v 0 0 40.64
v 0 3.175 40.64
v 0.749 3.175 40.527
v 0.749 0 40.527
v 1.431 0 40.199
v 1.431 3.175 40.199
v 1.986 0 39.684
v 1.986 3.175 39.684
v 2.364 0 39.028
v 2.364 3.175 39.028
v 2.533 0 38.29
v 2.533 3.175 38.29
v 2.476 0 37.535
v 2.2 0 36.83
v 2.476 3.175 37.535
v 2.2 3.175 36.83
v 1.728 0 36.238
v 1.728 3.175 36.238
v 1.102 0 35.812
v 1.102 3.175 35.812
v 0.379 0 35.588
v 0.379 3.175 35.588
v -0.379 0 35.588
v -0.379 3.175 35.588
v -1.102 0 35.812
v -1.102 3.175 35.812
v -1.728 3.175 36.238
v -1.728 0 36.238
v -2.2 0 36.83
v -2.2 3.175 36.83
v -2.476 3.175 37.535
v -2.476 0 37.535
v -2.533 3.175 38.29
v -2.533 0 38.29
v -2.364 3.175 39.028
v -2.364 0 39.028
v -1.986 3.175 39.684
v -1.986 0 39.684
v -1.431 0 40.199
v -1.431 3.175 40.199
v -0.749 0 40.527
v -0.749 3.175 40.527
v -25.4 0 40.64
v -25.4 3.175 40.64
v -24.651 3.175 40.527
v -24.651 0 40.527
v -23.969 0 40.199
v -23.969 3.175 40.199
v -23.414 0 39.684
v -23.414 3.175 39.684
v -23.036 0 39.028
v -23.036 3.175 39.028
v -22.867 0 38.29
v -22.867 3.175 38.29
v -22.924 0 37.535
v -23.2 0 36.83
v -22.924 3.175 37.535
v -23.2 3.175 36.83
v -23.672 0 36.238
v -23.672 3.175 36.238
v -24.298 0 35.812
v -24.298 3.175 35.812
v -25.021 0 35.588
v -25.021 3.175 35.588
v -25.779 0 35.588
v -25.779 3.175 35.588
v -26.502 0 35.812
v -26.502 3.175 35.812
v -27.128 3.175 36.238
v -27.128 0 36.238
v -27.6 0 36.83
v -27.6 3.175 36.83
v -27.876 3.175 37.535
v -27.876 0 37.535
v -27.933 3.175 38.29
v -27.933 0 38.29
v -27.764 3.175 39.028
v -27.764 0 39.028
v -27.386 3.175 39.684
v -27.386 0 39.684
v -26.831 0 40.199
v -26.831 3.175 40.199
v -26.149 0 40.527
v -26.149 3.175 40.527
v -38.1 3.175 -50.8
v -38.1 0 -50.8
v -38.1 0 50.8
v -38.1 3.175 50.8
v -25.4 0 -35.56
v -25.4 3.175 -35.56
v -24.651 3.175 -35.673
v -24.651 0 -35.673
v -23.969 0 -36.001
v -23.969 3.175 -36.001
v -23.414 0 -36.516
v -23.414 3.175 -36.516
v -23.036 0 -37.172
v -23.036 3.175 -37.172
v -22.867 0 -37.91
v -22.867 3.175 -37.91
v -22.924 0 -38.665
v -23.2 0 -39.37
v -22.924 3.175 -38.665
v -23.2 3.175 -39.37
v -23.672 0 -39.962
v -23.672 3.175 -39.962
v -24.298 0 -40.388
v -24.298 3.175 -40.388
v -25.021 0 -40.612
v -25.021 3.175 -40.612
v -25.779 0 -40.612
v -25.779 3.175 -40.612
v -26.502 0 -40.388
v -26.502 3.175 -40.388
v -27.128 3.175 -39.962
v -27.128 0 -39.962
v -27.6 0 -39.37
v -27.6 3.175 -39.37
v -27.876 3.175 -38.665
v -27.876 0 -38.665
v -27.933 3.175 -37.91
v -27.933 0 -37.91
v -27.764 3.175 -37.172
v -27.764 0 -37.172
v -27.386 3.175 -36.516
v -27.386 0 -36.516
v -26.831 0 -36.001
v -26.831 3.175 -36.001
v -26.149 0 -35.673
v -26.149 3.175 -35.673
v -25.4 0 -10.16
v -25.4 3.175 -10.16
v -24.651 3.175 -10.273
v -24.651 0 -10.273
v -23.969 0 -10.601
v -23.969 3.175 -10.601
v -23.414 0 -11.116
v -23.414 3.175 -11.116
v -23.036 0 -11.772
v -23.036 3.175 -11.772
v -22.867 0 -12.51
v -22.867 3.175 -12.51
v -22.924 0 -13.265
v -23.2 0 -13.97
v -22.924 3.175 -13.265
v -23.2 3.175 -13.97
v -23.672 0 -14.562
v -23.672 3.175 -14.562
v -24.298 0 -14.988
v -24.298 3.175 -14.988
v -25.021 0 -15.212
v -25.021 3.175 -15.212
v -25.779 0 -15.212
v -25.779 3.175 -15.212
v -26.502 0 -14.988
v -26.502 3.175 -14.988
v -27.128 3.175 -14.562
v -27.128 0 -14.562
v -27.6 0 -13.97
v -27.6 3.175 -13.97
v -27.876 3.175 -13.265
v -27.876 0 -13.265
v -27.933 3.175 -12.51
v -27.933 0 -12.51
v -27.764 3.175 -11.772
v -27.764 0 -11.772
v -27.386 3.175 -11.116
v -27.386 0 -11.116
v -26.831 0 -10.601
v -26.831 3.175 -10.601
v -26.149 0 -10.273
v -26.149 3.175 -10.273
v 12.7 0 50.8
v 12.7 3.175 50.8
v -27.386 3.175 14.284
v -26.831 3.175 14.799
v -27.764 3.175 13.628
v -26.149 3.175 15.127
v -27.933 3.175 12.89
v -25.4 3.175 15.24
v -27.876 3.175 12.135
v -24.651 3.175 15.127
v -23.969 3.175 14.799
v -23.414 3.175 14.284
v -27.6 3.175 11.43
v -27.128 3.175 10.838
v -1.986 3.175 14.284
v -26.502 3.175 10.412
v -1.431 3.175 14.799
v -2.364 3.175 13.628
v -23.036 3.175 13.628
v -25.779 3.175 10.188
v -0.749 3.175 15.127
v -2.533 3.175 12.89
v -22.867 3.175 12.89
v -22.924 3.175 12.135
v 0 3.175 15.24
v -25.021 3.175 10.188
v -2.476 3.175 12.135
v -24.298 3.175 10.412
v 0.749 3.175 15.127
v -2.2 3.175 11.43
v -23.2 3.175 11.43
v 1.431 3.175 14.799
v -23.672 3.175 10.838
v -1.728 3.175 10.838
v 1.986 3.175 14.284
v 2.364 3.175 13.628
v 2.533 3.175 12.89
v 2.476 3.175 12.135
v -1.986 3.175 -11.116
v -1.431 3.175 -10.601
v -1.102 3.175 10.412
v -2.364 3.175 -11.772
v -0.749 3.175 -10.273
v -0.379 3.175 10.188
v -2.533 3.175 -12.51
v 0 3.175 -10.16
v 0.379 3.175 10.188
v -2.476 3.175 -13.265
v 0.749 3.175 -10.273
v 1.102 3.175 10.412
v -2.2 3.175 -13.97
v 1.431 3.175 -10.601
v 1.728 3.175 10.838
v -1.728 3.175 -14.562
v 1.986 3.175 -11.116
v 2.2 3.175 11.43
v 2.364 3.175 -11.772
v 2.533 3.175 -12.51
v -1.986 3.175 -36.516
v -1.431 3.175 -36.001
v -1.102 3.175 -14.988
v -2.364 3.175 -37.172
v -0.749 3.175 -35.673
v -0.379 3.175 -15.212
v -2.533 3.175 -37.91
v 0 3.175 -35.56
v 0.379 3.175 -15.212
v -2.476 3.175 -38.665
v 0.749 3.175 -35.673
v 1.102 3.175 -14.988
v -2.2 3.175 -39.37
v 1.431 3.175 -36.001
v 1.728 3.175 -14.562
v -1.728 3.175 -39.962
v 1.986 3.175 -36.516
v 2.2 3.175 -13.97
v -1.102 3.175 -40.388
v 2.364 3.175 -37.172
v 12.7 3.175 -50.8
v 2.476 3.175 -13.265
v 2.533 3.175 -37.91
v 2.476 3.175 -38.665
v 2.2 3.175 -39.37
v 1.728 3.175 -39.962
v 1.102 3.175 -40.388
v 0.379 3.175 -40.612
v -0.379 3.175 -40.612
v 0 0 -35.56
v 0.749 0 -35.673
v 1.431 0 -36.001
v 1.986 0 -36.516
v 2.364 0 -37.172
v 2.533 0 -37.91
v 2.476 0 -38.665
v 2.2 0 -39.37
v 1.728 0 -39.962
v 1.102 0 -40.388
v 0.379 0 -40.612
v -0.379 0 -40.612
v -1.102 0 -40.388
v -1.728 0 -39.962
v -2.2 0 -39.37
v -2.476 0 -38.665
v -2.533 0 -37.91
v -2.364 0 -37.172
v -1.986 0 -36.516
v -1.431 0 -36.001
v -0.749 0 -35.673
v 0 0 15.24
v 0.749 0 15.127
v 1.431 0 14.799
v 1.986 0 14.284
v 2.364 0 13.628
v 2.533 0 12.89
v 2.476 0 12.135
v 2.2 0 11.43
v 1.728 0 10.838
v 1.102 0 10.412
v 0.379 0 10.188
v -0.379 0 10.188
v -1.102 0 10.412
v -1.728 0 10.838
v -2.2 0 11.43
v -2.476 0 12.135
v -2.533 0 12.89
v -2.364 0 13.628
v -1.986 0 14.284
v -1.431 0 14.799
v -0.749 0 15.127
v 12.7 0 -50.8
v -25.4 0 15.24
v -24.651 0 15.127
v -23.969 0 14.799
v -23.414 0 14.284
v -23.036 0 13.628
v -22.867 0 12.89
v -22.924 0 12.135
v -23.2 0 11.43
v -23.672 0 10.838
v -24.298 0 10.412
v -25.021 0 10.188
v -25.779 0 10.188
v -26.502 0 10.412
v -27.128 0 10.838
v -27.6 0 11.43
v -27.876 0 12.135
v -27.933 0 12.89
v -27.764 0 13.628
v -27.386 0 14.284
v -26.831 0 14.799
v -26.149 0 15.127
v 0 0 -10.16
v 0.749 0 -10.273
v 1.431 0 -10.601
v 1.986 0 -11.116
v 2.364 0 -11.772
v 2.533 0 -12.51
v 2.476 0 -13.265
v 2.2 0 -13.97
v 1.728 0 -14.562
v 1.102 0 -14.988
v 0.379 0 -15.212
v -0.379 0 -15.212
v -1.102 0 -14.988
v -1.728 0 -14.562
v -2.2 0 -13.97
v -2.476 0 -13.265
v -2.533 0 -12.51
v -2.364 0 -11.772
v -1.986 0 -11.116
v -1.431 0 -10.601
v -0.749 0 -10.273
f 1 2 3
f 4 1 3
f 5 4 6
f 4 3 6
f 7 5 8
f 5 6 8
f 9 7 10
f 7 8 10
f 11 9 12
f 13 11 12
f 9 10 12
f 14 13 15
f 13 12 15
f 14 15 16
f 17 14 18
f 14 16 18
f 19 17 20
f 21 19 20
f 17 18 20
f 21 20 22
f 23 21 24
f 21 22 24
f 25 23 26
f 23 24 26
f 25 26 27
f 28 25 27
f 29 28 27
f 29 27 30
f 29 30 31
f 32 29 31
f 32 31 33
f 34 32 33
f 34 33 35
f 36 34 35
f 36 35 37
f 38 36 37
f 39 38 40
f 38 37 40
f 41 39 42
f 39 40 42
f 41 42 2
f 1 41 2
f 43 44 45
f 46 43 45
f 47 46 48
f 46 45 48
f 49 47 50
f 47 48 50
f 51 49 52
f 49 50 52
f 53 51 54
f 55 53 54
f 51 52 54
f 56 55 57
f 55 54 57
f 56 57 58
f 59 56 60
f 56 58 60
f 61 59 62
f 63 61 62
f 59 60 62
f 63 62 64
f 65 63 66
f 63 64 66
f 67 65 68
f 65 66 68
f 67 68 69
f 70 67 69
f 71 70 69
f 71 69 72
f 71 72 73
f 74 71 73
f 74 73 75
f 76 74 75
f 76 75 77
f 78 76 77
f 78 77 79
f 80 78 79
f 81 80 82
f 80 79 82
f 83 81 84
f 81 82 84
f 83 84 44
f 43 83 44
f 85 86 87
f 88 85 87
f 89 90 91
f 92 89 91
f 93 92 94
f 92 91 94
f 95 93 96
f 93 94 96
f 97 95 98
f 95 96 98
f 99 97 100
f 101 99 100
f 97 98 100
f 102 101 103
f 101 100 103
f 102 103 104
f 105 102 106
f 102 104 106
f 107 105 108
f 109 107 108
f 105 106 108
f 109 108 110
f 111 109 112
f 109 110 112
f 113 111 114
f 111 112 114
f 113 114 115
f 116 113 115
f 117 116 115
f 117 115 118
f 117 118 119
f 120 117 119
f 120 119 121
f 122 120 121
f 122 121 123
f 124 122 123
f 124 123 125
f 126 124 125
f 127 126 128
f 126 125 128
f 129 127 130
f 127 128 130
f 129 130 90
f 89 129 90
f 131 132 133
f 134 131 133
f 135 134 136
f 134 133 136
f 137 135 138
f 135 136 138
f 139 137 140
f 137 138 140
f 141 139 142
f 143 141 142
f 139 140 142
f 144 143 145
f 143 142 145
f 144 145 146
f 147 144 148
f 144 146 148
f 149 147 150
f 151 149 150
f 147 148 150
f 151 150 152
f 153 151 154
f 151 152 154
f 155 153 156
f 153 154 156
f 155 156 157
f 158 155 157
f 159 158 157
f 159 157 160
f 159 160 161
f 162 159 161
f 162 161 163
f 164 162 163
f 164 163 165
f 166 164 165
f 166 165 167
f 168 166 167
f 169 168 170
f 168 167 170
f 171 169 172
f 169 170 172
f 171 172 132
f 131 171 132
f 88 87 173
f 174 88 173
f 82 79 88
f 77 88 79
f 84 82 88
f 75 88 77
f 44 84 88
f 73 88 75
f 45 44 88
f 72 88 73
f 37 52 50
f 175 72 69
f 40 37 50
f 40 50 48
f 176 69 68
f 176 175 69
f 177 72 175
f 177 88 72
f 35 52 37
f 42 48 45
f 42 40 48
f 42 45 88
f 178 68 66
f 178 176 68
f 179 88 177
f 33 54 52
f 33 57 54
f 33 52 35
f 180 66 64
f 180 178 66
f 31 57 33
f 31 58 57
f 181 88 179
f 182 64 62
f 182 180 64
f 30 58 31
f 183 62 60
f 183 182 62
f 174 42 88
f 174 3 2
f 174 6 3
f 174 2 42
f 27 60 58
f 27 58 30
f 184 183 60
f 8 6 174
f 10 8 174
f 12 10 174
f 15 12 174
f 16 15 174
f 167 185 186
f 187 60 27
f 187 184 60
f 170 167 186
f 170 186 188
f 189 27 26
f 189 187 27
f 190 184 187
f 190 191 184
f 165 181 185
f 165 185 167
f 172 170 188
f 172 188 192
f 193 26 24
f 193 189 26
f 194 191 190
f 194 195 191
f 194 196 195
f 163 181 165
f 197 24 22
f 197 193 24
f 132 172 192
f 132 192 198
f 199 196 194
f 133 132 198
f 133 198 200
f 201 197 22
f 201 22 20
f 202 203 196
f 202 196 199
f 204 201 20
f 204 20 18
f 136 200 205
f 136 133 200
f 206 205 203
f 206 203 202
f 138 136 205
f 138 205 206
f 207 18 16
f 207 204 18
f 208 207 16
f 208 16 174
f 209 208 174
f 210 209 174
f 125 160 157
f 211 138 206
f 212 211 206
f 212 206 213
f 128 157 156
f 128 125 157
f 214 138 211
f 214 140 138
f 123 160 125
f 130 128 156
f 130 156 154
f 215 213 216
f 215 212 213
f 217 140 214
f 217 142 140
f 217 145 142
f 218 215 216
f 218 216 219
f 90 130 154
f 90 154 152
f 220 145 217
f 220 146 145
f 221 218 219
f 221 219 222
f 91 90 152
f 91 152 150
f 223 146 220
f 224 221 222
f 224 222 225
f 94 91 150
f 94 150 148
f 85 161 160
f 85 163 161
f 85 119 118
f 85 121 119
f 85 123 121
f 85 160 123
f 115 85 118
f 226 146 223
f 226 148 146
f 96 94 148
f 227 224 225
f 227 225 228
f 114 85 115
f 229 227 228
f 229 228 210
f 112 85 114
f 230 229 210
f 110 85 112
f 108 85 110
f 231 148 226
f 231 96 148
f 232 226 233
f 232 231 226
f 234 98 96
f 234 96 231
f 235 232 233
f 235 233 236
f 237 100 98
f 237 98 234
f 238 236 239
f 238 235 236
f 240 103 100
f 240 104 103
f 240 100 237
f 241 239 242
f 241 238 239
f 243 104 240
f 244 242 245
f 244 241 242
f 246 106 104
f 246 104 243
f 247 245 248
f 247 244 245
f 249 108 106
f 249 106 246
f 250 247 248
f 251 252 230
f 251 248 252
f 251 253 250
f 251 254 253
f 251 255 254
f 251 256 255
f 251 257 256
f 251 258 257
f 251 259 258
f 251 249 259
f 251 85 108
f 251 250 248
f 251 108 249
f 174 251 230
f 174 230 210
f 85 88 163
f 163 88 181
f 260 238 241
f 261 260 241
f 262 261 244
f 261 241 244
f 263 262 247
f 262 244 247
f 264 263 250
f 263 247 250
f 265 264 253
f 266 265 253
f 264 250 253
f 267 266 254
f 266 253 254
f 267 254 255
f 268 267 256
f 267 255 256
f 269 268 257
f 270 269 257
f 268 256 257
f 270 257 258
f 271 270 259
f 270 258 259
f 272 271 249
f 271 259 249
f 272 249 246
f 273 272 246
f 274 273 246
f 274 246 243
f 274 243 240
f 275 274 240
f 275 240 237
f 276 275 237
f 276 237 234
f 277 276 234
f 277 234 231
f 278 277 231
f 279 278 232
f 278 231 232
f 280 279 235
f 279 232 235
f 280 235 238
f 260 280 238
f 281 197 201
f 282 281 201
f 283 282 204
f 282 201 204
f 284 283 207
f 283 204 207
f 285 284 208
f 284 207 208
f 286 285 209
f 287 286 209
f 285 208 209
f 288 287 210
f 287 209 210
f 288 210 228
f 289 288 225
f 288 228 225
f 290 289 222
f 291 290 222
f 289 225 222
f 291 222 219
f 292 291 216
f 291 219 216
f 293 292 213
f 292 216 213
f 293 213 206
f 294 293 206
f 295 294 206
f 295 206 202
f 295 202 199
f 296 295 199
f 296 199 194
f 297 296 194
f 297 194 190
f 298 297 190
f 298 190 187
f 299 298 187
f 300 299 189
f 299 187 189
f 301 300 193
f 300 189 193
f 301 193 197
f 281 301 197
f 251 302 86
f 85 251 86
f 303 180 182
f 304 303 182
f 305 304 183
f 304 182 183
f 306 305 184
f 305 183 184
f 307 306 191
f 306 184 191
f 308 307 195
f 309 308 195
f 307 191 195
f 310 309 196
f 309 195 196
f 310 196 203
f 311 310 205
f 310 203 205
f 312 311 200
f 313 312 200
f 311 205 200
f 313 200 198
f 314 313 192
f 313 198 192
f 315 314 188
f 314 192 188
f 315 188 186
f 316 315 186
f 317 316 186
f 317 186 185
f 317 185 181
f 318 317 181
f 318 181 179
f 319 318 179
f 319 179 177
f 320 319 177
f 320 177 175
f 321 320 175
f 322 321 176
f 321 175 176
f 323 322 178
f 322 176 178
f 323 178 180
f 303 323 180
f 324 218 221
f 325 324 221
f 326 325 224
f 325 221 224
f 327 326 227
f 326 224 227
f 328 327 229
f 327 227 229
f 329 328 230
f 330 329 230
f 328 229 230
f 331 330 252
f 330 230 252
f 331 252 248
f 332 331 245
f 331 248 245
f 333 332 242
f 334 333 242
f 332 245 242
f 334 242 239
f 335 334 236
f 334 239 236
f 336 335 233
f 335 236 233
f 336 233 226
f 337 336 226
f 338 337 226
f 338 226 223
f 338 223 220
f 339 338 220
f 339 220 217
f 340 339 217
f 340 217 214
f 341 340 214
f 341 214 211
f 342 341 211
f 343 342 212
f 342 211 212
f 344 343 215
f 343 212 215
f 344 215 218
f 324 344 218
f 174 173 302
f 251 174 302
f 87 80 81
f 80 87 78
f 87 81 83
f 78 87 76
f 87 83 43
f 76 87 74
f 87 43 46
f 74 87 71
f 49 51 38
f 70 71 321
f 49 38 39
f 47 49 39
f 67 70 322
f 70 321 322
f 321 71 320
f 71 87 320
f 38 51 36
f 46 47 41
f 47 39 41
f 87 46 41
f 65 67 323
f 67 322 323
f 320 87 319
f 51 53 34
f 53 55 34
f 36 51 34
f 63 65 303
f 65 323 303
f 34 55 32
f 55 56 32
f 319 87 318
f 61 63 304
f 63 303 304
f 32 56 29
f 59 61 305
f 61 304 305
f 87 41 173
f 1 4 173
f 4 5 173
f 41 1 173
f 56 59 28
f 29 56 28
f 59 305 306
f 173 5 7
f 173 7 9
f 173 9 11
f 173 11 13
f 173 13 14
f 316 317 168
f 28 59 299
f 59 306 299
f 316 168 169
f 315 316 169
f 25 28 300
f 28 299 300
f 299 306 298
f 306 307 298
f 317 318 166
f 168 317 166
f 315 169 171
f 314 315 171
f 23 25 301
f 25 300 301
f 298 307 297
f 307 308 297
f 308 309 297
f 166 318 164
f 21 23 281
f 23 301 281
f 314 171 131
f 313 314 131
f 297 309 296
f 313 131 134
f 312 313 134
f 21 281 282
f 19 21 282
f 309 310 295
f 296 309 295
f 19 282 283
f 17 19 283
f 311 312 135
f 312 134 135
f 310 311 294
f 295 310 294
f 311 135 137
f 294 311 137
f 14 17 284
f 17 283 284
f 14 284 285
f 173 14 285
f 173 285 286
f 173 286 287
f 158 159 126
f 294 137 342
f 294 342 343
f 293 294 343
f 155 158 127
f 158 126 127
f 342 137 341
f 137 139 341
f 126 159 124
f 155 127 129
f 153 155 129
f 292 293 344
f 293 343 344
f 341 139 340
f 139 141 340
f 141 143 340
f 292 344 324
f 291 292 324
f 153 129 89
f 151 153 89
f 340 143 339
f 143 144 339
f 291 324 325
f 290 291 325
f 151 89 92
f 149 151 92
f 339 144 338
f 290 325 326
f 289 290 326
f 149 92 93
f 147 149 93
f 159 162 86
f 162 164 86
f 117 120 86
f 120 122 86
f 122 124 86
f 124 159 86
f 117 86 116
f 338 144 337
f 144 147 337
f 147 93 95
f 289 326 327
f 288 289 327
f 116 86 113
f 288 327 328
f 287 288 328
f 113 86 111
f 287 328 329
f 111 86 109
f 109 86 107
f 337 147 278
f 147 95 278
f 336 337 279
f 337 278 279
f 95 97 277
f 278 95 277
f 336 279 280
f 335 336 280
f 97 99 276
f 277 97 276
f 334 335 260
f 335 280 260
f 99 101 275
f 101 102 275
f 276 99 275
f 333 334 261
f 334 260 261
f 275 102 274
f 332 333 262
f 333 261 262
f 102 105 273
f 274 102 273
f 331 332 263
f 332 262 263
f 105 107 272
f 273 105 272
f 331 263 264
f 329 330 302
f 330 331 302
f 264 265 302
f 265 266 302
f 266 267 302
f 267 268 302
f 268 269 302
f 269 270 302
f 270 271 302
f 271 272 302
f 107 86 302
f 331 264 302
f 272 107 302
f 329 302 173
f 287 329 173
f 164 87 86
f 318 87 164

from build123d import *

# Parameters (mm, degrees)
BOSS_EXTRUDE1_DEPTH = 3.175
SKETCH2_R           = 2.54
CUT_EXTRUDE1_DEPTH  = 3.175


with BuildPart() as part:
    # Sketch1 → Boss-Extrude1 (new body)
    with BuildSketch(Plane(origin=(0, 0, 0), x_dir=(1, 0, 0), z_dir=(0, 1, 0))):
        Polygon((-38.1, -50.8), (12.7, -50.8), (12.7, 0), (12.7, 50.8), (-38.1, 50.8), align=None)
    extrude(amount=BOSS_EXTRUDE1_DEPTH)

    # Sketch2 → Cut-Extrude1 (cut)
    with BuildSketch(Plane(origin=(0, 3.175, 0), x_dir=(1, 0, 0), z_dir=(0, 1, 0))):
        with Locations(Location((-25.4, 38.1, 0), (0, 0, 270))):
            Circle(SKETCH2_R)
        with Locations(Location((-25.4, 12.7, 0), (0, 0, 270))):
            Circle(SKETCH2_R)
        with Locations(Location((-25.4, -12.7, 0), (0, 0, 270))):
            Circle(SKETCH2_R)
        with Locations(Location((-25.4, -38.1, 0), (0, 0, 270))):
            Circle(SKETCH2_R)
        with Locations(Location((0, 12.7, 0), (0, 0, 270))):
            Circle(SKETCH2_R)
        with Locations(Location((0, -12.7, 0), (0, 0, 270))):
            Circle(SKETCH2_R)
        with Locations(Location((0, -38.1, 0), (0, 0, 270))):
            Circle(SKETCH2_R)
        with Locations(Location((0, 38.1, 0), (0, 0, 270))):
            Circle(SKETCH2_R)
    extrude(amount=-CUT_EXTRUDE1_DEPTH, mode=Mode.SUBTRACT)


solid = part.part
